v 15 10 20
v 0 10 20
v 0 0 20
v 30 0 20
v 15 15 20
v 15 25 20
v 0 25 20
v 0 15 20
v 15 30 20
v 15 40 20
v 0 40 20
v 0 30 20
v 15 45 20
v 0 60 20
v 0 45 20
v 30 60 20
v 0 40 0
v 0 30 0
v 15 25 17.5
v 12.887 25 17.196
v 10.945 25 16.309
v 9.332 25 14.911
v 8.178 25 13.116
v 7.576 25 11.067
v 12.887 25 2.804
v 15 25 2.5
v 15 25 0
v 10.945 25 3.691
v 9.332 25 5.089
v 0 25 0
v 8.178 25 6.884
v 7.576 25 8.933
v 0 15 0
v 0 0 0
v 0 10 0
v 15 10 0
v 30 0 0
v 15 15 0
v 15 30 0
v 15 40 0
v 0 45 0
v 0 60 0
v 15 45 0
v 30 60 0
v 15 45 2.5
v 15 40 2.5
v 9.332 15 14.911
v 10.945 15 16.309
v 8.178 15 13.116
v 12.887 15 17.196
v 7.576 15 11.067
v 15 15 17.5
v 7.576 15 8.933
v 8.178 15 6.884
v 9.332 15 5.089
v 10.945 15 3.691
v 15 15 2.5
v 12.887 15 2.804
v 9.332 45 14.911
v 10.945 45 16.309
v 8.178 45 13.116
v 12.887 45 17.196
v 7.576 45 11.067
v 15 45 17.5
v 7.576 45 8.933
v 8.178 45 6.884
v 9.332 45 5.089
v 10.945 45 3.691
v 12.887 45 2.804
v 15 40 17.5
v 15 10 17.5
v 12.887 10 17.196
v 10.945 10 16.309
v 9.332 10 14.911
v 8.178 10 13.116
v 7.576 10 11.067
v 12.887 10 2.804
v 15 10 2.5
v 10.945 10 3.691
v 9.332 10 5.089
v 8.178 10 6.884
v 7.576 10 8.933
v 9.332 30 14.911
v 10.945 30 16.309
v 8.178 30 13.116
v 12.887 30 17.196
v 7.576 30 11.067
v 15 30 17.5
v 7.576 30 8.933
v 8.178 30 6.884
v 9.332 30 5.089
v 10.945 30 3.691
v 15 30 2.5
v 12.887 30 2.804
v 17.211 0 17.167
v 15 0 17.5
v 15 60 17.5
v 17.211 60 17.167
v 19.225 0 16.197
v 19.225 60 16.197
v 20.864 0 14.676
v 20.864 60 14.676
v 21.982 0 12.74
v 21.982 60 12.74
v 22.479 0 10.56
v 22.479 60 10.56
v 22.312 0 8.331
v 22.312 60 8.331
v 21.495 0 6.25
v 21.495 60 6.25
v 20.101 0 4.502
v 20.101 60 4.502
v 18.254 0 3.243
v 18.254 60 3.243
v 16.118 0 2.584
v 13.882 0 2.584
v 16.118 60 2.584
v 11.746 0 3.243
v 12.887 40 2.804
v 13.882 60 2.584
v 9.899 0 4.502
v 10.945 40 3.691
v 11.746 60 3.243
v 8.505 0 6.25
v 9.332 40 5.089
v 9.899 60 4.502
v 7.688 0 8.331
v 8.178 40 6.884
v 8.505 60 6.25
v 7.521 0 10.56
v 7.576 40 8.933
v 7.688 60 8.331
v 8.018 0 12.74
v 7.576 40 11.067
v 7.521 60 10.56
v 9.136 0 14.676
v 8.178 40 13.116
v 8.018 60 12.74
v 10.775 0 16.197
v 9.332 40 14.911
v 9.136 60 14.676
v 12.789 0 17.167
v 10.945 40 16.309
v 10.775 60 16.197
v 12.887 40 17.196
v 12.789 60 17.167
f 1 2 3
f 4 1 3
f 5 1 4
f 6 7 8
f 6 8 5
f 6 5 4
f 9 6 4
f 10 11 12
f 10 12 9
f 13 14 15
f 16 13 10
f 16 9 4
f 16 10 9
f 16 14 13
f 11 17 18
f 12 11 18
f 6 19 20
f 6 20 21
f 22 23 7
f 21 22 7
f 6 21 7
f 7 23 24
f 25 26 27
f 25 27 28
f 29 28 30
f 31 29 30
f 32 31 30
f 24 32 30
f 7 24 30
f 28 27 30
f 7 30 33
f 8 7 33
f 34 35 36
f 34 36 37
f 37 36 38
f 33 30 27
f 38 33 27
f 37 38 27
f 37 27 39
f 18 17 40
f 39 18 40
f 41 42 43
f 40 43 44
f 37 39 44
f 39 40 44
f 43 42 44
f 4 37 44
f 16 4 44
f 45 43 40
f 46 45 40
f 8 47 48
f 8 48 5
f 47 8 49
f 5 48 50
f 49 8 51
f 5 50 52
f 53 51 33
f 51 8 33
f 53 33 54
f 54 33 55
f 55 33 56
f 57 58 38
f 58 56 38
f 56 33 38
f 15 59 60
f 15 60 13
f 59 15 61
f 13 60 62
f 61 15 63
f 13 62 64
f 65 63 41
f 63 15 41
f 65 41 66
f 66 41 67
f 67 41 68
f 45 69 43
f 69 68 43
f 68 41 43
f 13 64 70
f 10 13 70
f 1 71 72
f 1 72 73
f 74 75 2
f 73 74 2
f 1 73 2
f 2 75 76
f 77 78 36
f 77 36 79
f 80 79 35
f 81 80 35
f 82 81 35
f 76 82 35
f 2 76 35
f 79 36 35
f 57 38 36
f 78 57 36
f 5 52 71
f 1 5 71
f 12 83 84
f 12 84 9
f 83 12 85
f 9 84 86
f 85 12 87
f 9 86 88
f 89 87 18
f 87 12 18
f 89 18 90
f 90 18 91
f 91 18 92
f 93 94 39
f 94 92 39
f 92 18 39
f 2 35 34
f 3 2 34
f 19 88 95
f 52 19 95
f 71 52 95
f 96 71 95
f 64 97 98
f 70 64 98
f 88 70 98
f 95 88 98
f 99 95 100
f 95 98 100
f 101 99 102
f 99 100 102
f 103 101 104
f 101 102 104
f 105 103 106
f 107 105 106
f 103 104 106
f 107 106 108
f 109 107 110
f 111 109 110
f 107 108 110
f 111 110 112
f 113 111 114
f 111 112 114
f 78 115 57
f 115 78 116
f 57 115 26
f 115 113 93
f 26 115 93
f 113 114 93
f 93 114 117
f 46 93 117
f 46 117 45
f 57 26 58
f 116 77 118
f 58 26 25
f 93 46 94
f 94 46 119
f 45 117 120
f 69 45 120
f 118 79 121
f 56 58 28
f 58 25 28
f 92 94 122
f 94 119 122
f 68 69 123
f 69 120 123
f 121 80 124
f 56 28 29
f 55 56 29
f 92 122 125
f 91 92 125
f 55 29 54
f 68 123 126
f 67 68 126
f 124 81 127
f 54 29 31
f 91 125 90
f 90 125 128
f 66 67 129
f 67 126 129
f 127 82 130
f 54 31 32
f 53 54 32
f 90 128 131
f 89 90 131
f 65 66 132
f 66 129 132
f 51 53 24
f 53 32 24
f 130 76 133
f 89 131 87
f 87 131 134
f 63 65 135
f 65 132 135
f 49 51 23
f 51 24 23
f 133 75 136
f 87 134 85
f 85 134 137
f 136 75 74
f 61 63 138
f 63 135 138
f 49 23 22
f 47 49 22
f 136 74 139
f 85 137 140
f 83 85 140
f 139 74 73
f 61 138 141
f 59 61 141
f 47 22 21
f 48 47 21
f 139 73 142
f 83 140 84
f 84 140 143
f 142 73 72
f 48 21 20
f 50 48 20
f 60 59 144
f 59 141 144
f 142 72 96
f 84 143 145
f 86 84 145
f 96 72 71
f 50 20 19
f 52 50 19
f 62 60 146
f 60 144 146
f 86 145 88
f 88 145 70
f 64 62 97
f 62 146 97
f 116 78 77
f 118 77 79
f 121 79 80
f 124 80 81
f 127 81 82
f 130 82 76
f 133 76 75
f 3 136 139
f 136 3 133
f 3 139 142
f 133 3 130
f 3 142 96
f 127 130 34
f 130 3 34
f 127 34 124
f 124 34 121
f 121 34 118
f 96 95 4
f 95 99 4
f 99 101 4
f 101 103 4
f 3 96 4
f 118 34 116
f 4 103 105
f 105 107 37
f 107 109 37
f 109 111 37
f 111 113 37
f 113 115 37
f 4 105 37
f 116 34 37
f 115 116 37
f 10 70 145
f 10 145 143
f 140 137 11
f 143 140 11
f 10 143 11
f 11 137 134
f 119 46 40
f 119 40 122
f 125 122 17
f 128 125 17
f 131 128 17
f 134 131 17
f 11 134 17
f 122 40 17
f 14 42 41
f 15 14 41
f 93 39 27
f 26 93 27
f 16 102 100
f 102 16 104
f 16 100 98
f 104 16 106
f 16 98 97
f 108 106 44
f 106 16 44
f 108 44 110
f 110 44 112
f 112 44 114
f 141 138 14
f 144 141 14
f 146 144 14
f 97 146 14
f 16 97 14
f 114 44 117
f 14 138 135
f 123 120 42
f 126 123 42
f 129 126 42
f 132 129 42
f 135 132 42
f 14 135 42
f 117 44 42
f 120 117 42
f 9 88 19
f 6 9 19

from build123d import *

# Parameters (mm, degrees)
BOSS_EXTRUDE1_DEPTH = 20
SKETCH4_R           = 7.5
CUT_EXTRUDE1_DEPTH  = 71


with BuildPart() as part:
    # Sketch1 → Boss-Extrude1 (new body)
    with BuildSketch(Plane.XY):
        Polygon((0, 0), (30, 0), (30, 60), (0, 60), (0, 45), (15, 45), (15, 40), (0, 40), (0, 30), (15, 30), (15, 25), (0, 25), (0, 15), (15, 15), (15, 10), (0, 10), align=None)
    extrude(amount=BOSS_EXTRUDE1_DEPTH)

    # Sketch4 → Cut-Extrude1 (cut, through all)
    with BuildSketch(Plane(origin=(0, 60, 0), x_dir=(1, 0, 0), z_dir=(0, 1, 0))):
        with Locations(Location((15, -10, 0), (0, 0, 270))):
            Circle(SKETCH4_R)
    extrude(amount=-CUT_EXTRUDE1_DEPTH, mode=Mode.SUBTRACT)


solid = part.part
